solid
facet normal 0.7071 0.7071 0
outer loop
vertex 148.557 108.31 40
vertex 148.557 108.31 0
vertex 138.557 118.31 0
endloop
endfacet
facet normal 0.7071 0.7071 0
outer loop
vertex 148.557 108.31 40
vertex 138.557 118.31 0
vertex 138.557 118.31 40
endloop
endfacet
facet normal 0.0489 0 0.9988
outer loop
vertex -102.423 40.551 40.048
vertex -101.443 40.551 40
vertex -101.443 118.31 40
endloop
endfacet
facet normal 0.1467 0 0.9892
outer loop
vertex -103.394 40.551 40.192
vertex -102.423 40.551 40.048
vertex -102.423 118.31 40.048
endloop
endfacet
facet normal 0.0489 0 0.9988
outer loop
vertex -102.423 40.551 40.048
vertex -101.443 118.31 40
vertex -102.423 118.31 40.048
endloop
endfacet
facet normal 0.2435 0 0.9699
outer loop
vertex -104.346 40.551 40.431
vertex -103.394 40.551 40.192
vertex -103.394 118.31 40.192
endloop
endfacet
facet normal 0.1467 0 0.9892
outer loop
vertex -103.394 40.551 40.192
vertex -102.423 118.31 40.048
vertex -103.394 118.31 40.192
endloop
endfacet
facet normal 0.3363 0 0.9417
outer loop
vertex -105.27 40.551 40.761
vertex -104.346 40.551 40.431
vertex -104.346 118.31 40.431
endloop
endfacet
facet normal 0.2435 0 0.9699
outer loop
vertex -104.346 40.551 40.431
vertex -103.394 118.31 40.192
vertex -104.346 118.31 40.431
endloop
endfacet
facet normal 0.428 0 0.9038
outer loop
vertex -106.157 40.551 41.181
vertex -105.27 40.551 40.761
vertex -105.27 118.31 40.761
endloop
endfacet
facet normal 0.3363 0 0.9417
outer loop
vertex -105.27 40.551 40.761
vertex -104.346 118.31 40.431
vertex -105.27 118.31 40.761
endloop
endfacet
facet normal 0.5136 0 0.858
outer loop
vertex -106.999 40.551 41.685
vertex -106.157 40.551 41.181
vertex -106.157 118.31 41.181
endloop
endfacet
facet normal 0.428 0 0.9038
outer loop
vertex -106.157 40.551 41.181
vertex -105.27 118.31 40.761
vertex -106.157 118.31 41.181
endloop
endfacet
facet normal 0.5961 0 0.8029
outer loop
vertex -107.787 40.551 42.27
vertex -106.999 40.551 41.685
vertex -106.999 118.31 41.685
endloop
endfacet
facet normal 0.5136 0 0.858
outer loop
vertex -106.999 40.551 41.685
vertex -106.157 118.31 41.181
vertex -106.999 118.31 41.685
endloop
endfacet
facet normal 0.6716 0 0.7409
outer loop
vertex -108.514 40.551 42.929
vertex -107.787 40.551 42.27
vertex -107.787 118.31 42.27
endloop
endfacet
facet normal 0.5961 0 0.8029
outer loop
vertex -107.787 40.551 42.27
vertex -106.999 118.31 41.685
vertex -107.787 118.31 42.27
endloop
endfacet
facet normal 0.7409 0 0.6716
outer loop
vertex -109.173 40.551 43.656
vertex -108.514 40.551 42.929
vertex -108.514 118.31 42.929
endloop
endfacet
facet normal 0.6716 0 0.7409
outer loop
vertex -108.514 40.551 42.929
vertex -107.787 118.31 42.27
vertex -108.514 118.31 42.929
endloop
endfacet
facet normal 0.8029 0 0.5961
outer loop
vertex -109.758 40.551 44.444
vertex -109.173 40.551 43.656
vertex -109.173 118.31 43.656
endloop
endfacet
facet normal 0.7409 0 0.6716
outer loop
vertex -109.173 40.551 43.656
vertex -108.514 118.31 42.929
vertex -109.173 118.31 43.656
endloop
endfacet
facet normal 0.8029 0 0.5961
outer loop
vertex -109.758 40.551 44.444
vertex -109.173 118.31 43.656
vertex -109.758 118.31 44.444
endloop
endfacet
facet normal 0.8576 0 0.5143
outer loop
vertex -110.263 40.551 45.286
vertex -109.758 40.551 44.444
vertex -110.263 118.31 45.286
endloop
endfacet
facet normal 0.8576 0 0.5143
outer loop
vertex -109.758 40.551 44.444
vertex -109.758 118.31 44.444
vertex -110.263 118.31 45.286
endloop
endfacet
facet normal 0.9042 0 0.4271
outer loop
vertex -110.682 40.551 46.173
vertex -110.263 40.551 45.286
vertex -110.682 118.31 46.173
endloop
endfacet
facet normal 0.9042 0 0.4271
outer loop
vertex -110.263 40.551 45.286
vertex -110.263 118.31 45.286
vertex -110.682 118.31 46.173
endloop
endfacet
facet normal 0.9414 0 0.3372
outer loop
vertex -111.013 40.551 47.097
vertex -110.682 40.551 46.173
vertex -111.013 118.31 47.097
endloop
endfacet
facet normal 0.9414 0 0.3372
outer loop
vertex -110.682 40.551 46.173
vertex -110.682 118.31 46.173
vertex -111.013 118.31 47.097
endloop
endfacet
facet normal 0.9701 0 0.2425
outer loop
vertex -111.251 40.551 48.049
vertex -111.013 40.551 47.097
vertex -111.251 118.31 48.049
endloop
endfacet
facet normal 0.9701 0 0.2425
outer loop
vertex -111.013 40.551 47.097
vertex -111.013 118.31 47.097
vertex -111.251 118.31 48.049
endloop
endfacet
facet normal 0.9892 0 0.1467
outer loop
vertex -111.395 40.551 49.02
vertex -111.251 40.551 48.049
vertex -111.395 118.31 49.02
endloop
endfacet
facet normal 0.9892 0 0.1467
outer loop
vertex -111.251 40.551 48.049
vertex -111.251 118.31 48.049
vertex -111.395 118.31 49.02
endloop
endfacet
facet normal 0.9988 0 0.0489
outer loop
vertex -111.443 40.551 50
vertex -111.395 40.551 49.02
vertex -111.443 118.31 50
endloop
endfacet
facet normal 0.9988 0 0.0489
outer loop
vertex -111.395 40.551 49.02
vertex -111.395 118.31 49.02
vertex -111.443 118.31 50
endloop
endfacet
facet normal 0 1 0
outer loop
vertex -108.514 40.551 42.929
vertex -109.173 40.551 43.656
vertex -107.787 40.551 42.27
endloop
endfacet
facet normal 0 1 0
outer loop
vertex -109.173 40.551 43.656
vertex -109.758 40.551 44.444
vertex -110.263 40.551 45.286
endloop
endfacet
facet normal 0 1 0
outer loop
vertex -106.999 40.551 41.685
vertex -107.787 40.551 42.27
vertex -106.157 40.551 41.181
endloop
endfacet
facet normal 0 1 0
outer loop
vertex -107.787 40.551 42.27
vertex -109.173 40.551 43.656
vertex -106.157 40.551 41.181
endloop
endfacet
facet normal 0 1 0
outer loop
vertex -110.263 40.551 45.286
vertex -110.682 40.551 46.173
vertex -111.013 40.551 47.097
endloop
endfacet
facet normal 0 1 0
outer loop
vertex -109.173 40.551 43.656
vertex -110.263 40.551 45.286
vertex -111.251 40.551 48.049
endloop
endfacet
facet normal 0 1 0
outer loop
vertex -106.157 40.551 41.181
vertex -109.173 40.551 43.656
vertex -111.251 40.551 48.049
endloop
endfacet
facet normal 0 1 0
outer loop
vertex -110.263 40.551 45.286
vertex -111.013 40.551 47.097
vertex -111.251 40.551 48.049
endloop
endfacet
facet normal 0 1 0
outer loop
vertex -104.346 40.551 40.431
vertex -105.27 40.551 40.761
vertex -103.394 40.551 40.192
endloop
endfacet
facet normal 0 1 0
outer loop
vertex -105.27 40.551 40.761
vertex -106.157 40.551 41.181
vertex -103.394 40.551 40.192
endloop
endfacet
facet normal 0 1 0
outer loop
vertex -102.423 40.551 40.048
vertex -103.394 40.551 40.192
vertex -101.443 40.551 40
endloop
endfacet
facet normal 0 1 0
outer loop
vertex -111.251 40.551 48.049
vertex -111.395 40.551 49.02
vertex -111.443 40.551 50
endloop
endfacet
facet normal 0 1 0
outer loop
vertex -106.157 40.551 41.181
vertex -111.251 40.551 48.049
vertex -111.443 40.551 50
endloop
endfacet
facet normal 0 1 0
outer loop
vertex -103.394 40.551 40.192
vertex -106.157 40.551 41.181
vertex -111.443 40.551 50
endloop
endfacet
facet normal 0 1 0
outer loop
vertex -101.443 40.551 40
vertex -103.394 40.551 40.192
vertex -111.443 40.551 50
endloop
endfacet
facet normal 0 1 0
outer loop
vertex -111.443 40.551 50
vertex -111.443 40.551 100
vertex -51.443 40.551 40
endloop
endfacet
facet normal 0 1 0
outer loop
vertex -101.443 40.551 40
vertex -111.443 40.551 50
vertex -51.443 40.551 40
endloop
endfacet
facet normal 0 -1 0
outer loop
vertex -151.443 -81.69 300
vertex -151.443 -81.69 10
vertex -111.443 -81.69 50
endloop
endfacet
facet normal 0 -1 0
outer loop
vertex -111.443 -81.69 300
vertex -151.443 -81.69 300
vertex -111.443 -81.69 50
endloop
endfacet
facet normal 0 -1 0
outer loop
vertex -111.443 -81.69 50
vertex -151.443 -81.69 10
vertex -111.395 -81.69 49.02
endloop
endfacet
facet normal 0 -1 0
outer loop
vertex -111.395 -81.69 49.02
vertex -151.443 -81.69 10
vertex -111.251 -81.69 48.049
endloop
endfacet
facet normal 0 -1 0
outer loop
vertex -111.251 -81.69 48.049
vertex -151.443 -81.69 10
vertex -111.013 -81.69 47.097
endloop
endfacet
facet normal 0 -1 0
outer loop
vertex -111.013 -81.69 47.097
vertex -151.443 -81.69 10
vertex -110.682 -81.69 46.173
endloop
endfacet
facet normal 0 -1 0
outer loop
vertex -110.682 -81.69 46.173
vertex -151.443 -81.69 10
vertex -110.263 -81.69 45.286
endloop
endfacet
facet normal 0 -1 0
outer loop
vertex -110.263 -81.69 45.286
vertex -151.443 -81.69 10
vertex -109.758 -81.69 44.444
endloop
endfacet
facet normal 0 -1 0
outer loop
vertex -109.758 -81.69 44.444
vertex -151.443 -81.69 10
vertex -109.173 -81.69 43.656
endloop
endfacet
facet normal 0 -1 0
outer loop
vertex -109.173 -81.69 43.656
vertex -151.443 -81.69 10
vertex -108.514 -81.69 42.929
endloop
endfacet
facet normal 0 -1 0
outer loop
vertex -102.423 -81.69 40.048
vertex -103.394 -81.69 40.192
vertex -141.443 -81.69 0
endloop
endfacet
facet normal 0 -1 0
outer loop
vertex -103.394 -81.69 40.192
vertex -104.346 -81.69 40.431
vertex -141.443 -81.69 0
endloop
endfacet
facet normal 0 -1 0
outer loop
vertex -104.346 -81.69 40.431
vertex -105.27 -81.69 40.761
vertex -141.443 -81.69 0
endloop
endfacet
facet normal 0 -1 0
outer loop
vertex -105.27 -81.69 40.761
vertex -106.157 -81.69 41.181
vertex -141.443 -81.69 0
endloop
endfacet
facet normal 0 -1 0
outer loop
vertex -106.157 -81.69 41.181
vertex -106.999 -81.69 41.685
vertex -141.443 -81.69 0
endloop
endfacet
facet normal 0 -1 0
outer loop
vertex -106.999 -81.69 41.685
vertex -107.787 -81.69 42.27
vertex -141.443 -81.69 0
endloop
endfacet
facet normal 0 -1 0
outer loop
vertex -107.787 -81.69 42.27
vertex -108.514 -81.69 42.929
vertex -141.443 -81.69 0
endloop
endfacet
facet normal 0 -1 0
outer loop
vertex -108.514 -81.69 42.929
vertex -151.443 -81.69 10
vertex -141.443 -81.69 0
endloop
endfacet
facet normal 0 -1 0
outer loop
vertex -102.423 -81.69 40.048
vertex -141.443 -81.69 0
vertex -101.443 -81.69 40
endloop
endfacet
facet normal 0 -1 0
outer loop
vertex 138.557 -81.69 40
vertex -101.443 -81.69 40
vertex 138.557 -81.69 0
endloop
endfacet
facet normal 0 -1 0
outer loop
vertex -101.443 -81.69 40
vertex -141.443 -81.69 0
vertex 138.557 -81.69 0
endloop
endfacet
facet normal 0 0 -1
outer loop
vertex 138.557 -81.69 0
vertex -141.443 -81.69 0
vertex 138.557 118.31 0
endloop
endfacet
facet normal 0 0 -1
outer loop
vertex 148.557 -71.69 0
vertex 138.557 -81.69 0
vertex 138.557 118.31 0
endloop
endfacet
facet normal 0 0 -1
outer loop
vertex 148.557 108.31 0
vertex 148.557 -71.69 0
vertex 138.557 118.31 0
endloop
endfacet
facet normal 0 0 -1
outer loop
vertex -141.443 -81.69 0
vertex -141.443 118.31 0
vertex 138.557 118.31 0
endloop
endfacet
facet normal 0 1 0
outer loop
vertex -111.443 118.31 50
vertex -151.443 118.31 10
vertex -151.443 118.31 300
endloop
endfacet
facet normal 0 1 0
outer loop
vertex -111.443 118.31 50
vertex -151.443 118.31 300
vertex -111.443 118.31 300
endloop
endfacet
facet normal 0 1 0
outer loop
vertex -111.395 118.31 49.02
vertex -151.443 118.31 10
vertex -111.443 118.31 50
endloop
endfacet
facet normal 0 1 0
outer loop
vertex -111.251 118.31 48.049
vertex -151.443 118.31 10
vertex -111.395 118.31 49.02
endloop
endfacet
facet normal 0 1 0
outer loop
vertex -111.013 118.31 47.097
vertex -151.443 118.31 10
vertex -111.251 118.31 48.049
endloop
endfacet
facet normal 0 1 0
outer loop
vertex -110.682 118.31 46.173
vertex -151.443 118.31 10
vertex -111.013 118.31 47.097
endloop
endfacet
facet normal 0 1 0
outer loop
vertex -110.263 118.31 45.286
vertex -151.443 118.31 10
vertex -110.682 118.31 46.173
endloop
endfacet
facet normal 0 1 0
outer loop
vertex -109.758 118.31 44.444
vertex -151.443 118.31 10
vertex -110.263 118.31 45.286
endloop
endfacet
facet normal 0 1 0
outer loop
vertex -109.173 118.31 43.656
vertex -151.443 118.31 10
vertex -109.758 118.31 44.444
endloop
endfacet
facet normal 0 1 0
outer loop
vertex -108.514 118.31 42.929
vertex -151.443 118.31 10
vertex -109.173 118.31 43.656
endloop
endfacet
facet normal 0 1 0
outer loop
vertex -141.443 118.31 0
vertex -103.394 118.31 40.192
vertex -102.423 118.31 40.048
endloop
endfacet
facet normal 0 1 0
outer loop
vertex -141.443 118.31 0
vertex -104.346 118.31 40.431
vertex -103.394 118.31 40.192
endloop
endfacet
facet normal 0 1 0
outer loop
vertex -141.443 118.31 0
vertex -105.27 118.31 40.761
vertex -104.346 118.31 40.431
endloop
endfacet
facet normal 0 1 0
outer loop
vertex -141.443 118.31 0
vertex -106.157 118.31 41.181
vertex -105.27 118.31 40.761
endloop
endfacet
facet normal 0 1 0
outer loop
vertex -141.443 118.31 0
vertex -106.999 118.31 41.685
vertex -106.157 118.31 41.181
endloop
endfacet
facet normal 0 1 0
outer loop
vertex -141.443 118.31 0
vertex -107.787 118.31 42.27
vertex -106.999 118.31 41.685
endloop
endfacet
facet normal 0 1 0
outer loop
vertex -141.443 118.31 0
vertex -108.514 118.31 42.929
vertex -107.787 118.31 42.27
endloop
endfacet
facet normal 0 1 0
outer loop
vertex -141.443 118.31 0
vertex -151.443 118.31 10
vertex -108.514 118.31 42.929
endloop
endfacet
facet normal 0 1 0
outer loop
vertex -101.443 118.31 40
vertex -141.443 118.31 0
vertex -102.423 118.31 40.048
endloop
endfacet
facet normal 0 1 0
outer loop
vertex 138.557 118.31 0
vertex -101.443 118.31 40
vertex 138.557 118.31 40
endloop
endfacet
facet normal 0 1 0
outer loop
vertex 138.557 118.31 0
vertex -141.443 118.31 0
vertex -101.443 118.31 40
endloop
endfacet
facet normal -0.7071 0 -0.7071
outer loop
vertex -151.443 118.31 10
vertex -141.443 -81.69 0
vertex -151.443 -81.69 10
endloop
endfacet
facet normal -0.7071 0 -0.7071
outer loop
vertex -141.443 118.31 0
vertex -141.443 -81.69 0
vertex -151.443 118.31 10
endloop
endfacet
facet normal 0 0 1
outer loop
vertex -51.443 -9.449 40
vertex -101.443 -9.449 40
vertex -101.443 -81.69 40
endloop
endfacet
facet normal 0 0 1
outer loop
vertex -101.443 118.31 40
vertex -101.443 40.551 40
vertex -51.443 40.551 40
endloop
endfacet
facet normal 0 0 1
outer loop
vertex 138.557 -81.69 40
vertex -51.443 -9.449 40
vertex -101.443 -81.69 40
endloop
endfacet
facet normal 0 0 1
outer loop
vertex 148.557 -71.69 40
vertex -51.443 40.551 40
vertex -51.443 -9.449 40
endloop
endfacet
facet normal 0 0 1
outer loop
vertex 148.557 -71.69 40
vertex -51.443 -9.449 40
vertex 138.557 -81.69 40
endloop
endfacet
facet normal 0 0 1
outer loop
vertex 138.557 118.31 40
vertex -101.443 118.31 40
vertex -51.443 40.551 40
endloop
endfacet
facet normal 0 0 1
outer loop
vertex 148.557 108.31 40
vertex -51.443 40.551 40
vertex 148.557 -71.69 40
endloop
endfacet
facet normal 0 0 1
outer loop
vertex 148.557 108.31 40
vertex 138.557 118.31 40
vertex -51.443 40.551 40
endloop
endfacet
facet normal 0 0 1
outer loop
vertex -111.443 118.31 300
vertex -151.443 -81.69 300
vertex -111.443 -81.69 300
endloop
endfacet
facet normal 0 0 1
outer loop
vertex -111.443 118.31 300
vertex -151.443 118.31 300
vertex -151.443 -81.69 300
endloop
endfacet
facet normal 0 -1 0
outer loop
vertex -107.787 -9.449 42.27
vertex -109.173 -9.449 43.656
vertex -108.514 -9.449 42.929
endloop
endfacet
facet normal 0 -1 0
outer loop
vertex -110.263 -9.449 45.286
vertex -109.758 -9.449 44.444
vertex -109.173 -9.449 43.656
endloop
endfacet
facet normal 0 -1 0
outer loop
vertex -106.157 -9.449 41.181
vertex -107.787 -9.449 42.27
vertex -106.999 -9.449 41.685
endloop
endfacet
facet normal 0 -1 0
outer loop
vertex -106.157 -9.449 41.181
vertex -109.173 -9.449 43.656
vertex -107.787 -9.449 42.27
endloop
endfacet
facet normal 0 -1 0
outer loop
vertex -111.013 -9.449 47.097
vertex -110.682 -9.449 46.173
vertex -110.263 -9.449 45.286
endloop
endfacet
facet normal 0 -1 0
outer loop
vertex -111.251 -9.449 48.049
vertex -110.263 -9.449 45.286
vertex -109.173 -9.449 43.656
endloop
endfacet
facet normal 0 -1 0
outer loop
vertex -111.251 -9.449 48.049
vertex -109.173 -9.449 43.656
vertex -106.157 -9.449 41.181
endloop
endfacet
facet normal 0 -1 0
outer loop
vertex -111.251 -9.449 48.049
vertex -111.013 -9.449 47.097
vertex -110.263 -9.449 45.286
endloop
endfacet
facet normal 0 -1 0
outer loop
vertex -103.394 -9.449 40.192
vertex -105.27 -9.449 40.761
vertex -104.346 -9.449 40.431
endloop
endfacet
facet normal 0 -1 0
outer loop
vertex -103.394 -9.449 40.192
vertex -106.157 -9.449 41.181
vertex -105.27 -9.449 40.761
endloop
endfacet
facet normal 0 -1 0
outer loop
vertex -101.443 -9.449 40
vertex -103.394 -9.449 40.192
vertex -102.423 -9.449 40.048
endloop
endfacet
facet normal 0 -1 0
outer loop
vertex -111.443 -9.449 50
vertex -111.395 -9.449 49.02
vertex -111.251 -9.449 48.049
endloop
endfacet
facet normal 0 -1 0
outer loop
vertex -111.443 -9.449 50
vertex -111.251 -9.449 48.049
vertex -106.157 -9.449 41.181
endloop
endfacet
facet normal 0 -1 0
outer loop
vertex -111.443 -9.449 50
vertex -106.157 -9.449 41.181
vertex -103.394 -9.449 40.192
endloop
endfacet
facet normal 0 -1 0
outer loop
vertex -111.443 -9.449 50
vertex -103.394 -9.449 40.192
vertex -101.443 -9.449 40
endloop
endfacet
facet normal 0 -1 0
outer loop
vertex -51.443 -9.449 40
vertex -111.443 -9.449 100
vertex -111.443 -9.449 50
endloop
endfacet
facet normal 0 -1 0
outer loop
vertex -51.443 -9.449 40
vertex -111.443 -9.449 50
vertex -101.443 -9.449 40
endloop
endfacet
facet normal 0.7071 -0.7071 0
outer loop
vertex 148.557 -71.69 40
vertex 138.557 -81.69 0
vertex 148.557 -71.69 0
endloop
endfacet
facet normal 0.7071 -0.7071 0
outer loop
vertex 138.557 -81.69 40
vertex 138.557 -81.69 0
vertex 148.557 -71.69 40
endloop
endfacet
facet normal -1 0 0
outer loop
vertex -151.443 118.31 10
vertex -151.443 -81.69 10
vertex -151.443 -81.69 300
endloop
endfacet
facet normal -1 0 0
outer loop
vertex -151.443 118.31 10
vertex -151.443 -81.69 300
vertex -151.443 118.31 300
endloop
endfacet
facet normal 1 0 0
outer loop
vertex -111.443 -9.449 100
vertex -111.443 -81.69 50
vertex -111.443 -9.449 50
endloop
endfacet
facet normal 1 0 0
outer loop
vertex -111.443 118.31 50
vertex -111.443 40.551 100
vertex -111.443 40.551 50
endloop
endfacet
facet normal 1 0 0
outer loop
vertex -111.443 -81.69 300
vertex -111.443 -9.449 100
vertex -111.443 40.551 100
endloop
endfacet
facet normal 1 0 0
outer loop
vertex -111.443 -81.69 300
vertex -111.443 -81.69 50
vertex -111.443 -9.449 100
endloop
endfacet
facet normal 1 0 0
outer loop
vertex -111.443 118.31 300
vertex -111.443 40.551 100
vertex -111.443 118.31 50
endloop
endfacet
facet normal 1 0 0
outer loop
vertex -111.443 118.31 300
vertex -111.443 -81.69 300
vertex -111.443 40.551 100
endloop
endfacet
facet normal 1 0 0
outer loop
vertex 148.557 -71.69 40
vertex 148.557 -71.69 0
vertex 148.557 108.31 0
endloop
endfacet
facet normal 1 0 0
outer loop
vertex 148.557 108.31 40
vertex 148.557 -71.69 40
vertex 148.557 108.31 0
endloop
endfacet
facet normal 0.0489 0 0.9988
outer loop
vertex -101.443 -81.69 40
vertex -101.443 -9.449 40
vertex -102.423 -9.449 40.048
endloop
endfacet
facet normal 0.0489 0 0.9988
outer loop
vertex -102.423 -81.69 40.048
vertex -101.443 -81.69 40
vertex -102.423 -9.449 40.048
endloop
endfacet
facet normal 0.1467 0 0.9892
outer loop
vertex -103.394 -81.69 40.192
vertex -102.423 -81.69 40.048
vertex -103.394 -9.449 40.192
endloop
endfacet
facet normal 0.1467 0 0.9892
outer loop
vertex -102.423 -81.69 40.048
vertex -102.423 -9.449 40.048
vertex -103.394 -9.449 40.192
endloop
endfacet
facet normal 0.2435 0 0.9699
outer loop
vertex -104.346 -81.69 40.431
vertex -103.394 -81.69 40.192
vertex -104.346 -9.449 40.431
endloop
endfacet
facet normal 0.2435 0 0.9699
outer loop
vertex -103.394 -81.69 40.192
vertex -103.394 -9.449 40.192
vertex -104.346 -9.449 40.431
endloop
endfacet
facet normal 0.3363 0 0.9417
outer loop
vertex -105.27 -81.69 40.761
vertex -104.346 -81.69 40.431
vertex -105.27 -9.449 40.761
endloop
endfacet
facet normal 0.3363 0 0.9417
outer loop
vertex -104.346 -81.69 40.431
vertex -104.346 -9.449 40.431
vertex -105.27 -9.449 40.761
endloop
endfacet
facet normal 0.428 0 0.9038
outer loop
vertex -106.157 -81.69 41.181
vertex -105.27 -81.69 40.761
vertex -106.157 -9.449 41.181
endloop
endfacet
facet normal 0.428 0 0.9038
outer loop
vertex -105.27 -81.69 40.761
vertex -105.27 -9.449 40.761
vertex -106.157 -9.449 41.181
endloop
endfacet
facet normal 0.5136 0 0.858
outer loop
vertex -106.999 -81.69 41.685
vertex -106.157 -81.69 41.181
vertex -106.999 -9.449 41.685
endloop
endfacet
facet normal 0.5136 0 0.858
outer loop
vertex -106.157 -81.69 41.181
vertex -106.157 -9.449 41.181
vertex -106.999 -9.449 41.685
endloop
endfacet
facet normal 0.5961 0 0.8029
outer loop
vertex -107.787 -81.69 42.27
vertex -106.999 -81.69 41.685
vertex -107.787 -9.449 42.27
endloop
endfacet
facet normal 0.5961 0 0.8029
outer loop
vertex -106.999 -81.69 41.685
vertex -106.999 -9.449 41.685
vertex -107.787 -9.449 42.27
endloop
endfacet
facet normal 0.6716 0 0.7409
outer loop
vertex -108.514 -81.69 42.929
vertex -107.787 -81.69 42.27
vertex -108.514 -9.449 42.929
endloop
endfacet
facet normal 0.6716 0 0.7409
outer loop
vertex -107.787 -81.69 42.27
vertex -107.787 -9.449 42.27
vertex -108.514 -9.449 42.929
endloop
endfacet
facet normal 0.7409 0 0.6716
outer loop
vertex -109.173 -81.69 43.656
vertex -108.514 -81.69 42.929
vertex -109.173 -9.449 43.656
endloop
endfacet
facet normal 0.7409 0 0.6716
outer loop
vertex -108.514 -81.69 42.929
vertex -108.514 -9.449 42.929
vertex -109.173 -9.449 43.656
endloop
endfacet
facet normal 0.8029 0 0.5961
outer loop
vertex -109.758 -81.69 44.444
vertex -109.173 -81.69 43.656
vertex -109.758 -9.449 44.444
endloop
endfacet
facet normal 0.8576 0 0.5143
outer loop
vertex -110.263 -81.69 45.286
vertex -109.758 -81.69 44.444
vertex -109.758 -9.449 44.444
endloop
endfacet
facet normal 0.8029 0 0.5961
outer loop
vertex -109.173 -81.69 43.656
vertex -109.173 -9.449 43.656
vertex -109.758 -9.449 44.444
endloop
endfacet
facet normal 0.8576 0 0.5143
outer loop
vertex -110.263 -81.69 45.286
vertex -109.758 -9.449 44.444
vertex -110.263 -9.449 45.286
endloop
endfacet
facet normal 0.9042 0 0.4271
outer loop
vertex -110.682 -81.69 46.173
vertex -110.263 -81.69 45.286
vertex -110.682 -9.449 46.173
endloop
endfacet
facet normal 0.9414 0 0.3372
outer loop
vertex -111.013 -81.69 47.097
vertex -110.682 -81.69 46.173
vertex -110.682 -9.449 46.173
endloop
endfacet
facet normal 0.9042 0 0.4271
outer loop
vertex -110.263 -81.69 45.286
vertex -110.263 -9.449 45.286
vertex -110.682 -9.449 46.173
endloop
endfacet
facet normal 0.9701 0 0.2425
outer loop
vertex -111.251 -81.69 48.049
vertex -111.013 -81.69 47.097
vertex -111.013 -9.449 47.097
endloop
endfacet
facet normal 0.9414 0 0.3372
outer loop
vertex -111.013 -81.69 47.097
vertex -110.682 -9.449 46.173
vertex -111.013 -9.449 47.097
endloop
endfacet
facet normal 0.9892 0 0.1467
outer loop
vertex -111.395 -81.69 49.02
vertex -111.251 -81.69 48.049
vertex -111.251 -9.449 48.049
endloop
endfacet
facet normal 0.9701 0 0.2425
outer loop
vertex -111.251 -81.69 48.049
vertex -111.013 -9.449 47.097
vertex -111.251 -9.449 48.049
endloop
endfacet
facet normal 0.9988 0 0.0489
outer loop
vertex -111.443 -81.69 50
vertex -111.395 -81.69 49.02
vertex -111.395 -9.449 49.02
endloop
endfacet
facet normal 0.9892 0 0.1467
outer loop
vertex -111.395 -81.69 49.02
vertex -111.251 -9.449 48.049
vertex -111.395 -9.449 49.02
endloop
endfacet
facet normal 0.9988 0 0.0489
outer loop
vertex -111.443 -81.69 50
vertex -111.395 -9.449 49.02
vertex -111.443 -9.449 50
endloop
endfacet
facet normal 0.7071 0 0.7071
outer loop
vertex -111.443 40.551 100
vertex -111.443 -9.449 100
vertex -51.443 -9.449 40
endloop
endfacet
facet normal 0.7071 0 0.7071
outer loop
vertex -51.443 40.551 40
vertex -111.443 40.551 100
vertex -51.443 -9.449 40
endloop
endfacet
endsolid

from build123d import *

# Parameters (mm, degrees)
F0_W      = 300
F0_H      = 200
F1_DEPTH  = 300
F2_W      = 260
F2_H      = 200
F3_DEPTH  = 260
F4_R      = 10
F5_W      = 60
F5_H      = 50
F6_DEPTH  = 260
F7_SIZE   = 10
F8_W      = 60
F8_H      = 50
F9_DEPTH  = 200
F11_DEPTH = 50


# Not quite as in the source:
# - a feature names something its author has since deleted; it is built from what else it names


with BuildPart() as f1:
    # F0 (on Top) → F1 (new body)
    with BuildSketch(Plane.XY):
        with Locations((-1.4433003962, 18.309512734)):
            Rectangle(F0_W, F0_H)
    extrude(amount=F1_DEPTH)

    # F2 (on face) → F3 (cut)
    with BuildSketch(Plane.XY.offset(300)):
        with Locations((18.5566996038, 18.309512734)):
            Rectangle(F2_W, F2_H)
    extrude(amount=-F3_DEPTH, mode=Mode.SUBTRACT)

    # F4
    f4_edges = [f1.edges().sort_by_distance(p)[0] for p in [
        (-111.4433, 18.309513, 40),
    ]]
    fillet(f4_edges, radius=F4_R)

    # F5 (on face) → F6 (join)
    with BuildSketch(Plane.XY.offset(300)):
        with Locations((-81.4433003962, 15.5513301492)):
            Rectangle(F5_W, F5_H)
    extrude(amount=-F6_DEPTH)

    # F7
    f7_edges = [f1.edges().sort_by_distance(p)[0] for p in [
        (-151.4433, 18.309513, 0),
        (148.5567, -81.690487, 20),
        (148.5567, 118.309513, 20),
    ]]
    chamfer(f7_edges, length=F7_SIZE)

    # F8 (on face) → F9 (cut)
    with BuildSketch(Plane.XY.offset(300)):
        with Locations((-81.4433003962, 15.5513301492)):
            Rectangle(F8_W, F8_H)
    extrude(amount=-F9_DEPTH, mode=Mode.SUBTRACT)

    # F10 (on face) → F11 (cut)
    with BuildSketch(Plane.XZ.offset(9.4486698508)):
        Polygon((-51.4433003962, 100), (-111.4433003962, 100), (-51.4433003962, 40), align=None)
    extrude(amount=-F11_DEPTH, mode=Mode.SUBTRACT)


solid = f1.part
